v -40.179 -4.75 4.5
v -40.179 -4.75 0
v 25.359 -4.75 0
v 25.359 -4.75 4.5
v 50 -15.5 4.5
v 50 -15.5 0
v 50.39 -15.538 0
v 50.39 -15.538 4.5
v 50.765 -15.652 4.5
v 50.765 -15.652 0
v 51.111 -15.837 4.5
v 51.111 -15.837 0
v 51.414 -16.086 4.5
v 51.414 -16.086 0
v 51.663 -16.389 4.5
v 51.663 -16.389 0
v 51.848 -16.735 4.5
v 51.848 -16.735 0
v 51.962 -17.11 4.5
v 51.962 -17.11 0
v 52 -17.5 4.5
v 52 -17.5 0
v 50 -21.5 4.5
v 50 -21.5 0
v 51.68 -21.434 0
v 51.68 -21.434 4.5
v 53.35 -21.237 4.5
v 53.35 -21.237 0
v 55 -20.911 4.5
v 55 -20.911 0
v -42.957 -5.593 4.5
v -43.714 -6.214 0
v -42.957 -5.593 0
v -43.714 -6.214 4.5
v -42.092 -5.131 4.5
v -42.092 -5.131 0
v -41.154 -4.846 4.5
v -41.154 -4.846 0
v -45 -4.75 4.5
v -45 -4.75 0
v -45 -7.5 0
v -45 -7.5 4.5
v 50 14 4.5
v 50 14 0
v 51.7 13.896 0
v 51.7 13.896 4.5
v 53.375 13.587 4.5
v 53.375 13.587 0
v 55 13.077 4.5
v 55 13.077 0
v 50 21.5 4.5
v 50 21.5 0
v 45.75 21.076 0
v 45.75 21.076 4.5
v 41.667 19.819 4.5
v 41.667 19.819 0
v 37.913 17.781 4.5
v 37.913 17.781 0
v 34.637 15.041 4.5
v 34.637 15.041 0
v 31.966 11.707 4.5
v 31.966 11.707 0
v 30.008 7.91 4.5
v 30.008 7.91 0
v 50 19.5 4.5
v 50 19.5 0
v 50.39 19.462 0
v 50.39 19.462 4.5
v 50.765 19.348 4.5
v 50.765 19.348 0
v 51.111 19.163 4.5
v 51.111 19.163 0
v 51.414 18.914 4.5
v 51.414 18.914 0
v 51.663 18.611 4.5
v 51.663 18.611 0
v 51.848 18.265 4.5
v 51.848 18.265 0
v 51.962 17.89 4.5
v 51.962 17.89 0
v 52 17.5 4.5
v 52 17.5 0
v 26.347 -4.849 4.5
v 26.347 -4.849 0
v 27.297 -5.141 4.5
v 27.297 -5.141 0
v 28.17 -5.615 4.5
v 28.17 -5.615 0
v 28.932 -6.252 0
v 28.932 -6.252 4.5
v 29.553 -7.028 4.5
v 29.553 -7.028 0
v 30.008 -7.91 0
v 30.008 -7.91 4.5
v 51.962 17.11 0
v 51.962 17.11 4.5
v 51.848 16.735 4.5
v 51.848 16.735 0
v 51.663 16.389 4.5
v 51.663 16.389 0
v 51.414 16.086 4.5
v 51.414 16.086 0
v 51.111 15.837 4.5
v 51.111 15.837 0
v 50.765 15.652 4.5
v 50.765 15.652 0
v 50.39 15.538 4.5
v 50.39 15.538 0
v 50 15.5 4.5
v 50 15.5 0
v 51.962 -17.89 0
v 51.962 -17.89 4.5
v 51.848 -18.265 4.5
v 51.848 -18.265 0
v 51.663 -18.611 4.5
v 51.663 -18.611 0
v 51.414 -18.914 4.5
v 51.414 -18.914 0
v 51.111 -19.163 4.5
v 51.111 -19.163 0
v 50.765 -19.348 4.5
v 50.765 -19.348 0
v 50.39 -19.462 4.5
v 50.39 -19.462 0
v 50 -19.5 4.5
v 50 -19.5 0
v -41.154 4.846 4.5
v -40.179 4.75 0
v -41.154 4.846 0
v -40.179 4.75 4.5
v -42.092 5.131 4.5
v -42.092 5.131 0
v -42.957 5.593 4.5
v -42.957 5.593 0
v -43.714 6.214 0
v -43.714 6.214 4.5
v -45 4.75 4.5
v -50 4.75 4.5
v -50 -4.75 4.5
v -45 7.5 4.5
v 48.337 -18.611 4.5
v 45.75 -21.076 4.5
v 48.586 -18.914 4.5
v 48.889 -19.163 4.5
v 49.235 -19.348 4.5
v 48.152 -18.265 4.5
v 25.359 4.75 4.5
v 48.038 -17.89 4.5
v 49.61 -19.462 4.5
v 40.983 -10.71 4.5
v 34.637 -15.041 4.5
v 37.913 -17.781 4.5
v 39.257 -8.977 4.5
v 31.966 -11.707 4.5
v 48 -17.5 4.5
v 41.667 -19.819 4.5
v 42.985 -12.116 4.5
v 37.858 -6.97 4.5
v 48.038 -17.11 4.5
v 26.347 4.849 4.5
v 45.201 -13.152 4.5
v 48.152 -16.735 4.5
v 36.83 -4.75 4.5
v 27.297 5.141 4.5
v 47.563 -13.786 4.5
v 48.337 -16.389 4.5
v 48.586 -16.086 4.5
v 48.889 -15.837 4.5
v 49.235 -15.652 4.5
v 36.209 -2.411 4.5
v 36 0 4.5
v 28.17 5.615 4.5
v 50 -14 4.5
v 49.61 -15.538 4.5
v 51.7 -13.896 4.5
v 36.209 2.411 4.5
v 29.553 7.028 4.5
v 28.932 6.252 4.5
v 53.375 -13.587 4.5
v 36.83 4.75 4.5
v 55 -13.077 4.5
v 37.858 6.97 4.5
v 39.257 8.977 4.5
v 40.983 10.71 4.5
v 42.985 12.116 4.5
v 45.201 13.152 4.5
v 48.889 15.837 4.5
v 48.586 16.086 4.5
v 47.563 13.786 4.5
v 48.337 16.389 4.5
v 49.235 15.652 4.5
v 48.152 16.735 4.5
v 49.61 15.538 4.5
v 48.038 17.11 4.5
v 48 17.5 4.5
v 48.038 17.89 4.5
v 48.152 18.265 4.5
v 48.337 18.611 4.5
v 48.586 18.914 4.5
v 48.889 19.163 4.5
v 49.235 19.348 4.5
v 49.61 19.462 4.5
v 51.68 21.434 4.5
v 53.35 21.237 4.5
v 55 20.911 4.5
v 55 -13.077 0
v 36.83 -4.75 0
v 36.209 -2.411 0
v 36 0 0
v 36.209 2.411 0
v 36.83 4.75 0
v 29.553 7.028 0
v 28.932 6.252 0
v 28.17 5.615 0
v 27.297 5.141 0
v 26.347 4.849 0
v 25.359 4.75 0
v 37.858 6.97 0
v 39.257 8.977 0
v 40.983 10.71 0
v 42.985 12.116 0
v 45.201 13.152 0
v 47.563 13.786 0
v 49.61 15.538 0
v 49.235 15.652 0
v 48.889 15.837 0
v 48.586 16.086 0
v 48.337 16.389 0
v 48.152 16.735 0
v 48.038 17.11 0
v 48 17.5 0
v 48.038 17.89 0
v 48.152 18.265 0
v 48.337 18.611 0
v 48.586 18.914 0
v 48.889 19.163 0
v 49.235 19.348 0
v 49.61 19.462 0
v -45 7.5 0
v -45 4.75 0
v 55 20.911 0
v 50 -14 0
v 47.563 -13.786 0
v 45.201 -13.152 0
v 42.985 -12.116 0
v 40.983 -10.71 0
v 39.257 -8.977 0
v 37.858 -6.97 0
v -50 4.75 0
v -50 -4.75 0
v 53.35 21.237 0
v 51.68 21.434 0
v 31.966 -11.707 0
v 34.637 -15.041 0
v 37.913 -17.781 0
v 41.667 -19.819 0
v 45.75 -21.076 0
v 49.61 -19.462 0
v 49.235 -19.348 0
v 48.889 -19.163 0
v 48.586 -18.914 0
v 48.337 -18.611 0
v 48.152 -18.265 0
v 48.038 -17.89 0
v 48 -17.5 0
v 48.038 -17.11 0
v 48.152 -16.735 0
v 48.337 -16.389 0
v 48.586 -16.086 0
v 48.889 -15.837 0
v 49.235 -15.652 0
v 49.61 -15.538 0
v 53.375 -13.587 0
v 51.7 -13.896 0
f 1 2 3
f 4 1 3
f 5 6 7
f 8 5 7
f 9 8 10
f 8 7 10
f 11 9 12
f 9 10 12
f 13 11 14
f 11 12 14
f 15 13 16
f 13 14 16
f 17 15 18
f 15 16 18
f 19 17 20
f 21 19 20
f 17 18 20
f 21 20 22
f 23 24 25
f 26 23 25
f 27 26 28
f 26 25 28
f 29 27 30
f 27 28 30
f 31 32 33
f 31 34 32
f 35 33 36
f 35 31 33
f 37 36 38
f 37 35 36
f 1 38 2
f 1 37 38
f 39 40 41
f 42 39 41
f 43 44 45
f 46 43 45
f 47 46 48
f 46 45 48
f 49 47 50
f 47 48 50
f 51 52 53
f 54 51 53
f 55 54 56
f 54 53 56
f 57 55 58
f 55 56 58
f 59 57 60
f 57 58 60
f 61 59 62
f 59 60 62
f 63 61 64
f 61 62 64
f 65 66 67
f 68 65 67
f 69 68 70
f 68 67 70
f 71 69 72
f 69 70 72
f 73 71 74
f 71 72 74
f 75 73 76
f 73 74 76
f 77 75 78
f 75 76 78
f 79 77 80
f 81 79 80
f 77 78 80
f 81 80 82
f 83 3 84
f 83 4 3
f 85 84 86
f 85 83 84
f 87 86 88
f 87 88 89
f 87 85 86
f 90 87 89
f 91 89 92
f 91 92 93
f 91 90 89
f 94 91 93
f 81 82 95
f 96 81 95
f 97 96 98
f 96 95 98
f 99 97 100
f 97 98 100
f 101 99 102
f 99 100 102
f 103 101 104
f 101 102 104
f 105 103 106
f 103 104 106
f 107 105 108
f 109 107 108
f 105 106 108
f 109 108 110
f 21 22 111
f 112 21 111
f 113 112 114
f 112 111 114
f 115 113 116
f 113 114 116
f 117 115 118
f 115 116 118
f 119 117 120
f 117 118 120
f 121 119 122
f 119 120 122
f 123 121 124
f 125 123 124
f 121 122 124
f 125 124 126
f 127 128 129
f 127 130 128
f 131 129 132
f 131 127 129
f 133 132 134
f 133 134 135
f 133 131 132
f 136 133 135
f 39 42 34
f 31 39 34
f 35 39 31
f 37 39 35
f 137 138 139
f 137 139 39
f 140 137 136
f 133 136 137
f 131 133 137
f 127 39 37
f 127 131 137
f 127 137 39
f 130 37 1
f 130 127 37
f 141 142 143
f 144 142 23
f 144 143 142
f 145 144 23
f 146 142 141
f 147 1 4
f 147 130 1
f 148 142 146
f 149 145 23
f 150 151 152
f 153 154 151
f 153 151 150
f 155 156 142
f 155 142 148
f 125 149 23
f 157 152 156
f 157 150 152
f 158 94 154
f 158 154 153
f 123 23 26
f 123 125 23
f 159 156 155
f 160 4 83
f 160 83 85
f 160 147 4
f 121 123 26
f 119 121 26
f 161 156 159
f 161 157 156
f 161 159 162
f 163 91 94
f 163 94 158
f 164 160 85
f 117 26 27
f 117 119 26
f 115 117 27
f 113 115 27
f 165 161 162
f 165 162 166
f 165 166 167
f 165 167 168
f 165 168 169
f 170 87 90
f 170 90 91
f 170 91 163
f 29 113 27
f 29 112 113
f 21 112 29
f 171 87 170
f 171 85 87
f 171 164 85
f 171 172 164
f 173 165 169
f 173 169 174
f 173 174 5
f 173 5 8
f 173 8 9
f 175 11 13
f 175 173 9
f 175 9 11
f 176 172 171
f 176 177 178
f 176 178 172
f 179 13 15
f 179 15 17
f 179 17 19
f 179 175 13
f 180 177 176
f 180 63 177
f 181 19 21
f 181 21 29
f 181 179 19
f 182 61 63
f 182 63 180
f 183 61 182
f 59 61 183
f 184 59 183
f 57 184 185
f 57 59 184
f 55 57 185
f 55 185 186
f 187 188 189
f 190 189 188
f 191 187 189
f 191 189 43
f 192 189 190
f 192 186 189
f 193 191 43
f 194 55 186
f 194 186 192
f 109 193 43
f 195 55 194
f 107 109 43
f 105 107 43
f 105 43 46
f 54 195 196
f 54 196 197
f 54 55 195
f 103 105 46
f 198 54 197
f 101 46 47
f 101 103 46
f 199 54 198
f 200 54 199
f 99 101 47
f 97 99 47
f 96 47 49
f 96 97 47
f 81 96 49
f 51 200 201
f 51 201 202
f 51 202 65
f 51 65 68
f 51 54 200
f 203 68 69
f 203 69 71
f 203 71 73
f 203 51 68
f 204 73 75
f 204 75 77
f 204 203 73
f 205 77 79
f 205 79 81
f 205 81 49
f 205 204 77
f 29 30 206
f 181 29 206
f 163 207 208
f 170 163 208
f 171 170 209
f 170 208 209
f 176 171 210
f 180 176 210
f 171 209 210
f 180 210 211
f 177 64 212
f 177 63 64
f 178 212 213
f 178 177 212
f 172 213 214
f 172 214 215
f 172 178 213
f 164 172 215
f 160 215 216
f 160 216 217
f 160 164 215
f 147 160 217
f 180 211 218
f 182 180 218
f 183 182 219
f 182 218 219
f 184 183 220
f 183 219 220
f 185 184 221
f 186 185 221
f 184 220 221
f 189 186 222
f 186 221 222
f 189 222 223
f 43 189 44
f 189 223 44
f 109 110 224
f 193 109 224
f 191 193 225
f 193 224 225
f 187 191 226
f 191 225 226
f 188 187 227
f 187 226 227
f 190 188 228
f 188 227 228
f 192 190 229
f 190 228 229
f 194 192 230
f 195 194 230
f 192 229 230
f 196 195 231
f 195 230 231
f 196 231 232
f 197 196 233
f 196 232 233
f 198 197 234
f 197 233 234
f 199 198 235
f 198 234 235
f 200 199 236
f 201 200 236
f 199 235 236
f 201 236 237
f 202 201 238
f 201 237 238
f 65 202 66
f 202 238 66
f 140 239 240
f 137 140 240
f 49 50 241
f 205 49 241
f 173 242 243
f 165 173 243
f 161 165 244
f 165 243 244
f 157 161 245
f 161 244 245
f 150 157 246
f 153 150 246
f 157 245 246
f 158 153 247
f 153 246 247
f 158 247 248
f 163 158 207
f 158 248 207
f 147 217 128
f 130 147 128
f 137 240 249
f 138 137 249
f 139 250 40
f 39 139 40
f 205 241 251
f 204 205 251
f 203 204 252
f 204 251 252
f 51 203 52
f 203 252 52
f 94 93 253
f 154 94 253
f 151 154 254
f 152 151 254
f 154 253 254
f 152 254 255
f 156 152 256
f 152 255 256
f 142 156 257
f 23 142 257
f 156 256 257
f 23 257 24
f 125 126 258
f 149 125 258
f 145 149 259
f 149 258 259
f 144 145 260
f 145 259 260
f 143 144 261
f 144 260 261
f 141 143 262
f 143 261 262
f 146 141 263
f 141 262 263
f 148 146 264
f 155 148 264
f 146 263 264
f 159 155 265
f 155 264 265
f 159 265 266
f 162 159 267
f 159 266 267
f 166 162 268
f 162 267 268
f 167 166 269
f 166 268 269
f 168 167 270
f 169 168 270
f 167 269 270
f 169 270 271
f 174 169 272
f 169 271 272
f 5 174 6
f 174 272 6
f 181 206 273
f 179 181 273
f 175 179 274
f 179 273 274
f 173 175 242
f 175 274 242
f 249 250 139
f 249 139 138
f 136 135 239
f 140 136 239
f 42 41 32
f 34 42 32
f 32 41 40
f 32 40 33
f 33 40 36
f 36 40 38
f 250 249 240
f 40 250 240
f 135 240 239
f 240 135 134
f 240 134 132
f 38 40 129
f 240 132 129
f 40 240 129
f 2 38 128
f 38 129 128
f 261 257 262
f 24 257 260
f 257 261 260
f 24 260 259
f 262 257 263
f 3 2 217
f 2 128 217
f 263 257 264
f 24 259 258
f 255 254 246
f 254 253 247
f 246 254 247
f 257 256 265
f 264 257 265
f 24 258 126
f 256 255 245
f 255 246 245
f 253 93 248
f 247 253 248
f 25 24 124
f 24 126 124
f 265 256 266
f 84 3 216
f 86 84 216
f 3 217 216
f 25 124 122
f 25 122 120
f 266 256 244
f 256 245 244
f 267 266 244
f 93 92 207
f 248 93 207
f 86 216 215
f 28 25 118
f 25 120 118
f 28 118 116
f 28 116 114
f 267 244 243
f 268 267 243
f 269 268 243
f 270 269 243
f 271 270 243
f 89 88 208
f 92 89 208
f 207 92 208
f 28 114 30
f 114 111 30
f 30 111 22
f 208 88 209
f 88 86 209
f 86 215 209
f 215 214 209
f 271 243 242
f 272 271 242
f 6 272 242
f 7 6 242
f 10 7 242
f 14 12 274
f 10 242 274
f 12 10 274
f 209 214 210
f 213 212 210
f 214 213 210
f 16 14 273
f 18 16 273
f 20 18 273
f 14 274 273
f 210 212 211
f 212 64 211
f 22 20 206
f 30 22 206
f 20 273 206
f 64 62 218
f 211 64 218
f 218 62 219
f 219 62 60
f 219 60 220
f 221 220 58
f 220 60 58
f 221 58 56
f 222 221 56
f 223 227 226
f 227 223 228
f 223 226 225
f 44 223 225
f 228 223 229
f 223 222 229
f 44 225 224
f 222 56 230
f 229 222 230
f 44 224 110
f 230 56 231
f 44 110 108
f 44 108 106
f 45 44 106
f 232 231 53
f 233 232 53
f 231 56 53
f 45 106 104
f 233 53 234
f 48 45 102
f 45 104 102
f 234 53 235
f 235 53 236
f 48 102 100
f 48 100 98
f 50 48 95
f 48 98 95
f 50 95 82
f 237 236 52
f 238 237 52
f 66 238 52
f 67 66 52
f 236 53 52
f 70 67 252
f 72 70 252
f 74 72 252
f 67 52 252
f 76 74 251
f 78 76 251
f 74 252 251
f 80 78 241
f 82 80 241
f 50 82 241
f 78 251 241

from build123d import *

# Parameters (mm, degrees)
F0_W     = 5
F0_H     = 9.5
F1_DEPTH = 4.5
F2_R     = 5


with BuildPart() as f1:
    # F0 (on Top) → F1 (new body)
    with BuildSketch(Plane.XY):
        with Locations((-47.5, 0)):
            Rectangle(F0_W, F0_H)
        with BuildLine():
            Line((36.8304328089, 4.75), (29.0312732862, 4.75))
            ThreePointArc((29.0312732862, 4.75), (28.5, 0), (29.0312732862, -4.75))
            Line((29.0312732862, -4.75), (36.8304328089, -4.75))
            ThreePointArc((36.8304328089, -4.75), (36, 0), (36.8304328089, 4.75))
        make_face()
        with BuildLine():
            ThreePointArc((50, 21.5), (36.5812630997, 16.7984374273), (29.0312732862, 4.75))
            Line((29.0312732862, 4.75), (36.8304328089, 4.75))
            ThreePointArc((36.8304328089, 4.75), (41.9532615303, 11.4564392374), (50, 14))
            Line((50, 14), (50, 15.5))
            ThreePointArc((50, 15.5), (48, 17.5), (50, 19.5))
            Line((50, 19.5), (50, 21.5))
        make_face()
        with BuildLine():
            Line((36.8304328089, -4.75), (29.0312732862, -4.75))
            ThreePointArc((29.0312732862, -4.75), (36.5812630997, -16.7984374273), (50, -21.5))
            Line((50, -21.5), (50, -19.5))
            ThreePointArc((50, -19.5), (48, -17.5), (50, -15.5))
            Line((50, -15.5), (50, -14))
            ThreePointArc((50, -14), (41.9532615303, -11.4564392374), (36.8304328089, -4.75))
        make_face()
        with BuildLine():
            Line((50, -19.5), (50, -21.5))
            ThreePointArc((50, -21.5), (52.5173141614, -21.3521223632), (55, -20.9105236663))
            Line((55, -20.9105236663), (55, -13.0766968306))
            ThreePointArc((55, -13.0766968306), (52.542267135, -13.7672392953), (50, -14))
            Line((50, -14), (50, -15.5))
            ThreePointArc((50, -15.5), (51.4142135624, -16.0857864376), (52, -17.5))
            ThreePointArc((52, -17.5), (51.4142135624, -18.9142135624), (50, -19.5))
        make_face()
        with BuildLine():
            ThreePointArc((55, 20.9105236663), (52.5173141614, 21.3521223632), (50, 21.5))
            Line((50, 21.5), (50, 19.5))
            ThreePointArc((50, 19.5), (51.4142135624, 18.9142135624), (52, 17.5))
            ThreePointArc((52, 17.5), (51.4142135624, 16.0857864376), (50, 15.5))
            Line((50, 15.5), (50, 14))
            ThreePointArc((50, 14), (52.542267135, 13.7672392953), (55, 13.0766968306))
            Line((55, 13.0766968306), (55, 20.9105236663))
        make_face()
        with BuildLine():
            Line((29.0312732862, 4.75), (-42.25, 4.75))
            Line((-42.25, 4.75), (-37.5, 0))
            Line((-37.5, 0), (-42.25, -4.75))
            Line((-42.25, -4.75), (29.0312732862, -4.75))
            ThreePointArc((29.0312732862, -4.75), (28.5, 0), (29.0312732862, 4.75))
        make_face()
        Polygon((-42.25, 4.75), (-45, 4.75), (-45, -4.75), (-42.25, -4.75), (-37.5, 0), align=None)
        Polygon((-45, 7.5), (-45, 4.75), (-42.25, 4.75), align=None)
        Polygon((-42.25, -4.75), (-45, -4.75), (-45, -7.5), align=None)
    extrude(amount=F1_DEPTH)

    # F2
    f2_edges = [f1.edges().sort_by_distance(p)[0] for p in [
        (29.031273, -4.75, 2.25),
        (29.031273, 4.75, 2.25),
        (-42.25, -4.75, 2.25),
        (-42.25, 4.75, 2.25),
    ]]
    fillet(f2_edges, radius=F2_R)


solid = f1.part
